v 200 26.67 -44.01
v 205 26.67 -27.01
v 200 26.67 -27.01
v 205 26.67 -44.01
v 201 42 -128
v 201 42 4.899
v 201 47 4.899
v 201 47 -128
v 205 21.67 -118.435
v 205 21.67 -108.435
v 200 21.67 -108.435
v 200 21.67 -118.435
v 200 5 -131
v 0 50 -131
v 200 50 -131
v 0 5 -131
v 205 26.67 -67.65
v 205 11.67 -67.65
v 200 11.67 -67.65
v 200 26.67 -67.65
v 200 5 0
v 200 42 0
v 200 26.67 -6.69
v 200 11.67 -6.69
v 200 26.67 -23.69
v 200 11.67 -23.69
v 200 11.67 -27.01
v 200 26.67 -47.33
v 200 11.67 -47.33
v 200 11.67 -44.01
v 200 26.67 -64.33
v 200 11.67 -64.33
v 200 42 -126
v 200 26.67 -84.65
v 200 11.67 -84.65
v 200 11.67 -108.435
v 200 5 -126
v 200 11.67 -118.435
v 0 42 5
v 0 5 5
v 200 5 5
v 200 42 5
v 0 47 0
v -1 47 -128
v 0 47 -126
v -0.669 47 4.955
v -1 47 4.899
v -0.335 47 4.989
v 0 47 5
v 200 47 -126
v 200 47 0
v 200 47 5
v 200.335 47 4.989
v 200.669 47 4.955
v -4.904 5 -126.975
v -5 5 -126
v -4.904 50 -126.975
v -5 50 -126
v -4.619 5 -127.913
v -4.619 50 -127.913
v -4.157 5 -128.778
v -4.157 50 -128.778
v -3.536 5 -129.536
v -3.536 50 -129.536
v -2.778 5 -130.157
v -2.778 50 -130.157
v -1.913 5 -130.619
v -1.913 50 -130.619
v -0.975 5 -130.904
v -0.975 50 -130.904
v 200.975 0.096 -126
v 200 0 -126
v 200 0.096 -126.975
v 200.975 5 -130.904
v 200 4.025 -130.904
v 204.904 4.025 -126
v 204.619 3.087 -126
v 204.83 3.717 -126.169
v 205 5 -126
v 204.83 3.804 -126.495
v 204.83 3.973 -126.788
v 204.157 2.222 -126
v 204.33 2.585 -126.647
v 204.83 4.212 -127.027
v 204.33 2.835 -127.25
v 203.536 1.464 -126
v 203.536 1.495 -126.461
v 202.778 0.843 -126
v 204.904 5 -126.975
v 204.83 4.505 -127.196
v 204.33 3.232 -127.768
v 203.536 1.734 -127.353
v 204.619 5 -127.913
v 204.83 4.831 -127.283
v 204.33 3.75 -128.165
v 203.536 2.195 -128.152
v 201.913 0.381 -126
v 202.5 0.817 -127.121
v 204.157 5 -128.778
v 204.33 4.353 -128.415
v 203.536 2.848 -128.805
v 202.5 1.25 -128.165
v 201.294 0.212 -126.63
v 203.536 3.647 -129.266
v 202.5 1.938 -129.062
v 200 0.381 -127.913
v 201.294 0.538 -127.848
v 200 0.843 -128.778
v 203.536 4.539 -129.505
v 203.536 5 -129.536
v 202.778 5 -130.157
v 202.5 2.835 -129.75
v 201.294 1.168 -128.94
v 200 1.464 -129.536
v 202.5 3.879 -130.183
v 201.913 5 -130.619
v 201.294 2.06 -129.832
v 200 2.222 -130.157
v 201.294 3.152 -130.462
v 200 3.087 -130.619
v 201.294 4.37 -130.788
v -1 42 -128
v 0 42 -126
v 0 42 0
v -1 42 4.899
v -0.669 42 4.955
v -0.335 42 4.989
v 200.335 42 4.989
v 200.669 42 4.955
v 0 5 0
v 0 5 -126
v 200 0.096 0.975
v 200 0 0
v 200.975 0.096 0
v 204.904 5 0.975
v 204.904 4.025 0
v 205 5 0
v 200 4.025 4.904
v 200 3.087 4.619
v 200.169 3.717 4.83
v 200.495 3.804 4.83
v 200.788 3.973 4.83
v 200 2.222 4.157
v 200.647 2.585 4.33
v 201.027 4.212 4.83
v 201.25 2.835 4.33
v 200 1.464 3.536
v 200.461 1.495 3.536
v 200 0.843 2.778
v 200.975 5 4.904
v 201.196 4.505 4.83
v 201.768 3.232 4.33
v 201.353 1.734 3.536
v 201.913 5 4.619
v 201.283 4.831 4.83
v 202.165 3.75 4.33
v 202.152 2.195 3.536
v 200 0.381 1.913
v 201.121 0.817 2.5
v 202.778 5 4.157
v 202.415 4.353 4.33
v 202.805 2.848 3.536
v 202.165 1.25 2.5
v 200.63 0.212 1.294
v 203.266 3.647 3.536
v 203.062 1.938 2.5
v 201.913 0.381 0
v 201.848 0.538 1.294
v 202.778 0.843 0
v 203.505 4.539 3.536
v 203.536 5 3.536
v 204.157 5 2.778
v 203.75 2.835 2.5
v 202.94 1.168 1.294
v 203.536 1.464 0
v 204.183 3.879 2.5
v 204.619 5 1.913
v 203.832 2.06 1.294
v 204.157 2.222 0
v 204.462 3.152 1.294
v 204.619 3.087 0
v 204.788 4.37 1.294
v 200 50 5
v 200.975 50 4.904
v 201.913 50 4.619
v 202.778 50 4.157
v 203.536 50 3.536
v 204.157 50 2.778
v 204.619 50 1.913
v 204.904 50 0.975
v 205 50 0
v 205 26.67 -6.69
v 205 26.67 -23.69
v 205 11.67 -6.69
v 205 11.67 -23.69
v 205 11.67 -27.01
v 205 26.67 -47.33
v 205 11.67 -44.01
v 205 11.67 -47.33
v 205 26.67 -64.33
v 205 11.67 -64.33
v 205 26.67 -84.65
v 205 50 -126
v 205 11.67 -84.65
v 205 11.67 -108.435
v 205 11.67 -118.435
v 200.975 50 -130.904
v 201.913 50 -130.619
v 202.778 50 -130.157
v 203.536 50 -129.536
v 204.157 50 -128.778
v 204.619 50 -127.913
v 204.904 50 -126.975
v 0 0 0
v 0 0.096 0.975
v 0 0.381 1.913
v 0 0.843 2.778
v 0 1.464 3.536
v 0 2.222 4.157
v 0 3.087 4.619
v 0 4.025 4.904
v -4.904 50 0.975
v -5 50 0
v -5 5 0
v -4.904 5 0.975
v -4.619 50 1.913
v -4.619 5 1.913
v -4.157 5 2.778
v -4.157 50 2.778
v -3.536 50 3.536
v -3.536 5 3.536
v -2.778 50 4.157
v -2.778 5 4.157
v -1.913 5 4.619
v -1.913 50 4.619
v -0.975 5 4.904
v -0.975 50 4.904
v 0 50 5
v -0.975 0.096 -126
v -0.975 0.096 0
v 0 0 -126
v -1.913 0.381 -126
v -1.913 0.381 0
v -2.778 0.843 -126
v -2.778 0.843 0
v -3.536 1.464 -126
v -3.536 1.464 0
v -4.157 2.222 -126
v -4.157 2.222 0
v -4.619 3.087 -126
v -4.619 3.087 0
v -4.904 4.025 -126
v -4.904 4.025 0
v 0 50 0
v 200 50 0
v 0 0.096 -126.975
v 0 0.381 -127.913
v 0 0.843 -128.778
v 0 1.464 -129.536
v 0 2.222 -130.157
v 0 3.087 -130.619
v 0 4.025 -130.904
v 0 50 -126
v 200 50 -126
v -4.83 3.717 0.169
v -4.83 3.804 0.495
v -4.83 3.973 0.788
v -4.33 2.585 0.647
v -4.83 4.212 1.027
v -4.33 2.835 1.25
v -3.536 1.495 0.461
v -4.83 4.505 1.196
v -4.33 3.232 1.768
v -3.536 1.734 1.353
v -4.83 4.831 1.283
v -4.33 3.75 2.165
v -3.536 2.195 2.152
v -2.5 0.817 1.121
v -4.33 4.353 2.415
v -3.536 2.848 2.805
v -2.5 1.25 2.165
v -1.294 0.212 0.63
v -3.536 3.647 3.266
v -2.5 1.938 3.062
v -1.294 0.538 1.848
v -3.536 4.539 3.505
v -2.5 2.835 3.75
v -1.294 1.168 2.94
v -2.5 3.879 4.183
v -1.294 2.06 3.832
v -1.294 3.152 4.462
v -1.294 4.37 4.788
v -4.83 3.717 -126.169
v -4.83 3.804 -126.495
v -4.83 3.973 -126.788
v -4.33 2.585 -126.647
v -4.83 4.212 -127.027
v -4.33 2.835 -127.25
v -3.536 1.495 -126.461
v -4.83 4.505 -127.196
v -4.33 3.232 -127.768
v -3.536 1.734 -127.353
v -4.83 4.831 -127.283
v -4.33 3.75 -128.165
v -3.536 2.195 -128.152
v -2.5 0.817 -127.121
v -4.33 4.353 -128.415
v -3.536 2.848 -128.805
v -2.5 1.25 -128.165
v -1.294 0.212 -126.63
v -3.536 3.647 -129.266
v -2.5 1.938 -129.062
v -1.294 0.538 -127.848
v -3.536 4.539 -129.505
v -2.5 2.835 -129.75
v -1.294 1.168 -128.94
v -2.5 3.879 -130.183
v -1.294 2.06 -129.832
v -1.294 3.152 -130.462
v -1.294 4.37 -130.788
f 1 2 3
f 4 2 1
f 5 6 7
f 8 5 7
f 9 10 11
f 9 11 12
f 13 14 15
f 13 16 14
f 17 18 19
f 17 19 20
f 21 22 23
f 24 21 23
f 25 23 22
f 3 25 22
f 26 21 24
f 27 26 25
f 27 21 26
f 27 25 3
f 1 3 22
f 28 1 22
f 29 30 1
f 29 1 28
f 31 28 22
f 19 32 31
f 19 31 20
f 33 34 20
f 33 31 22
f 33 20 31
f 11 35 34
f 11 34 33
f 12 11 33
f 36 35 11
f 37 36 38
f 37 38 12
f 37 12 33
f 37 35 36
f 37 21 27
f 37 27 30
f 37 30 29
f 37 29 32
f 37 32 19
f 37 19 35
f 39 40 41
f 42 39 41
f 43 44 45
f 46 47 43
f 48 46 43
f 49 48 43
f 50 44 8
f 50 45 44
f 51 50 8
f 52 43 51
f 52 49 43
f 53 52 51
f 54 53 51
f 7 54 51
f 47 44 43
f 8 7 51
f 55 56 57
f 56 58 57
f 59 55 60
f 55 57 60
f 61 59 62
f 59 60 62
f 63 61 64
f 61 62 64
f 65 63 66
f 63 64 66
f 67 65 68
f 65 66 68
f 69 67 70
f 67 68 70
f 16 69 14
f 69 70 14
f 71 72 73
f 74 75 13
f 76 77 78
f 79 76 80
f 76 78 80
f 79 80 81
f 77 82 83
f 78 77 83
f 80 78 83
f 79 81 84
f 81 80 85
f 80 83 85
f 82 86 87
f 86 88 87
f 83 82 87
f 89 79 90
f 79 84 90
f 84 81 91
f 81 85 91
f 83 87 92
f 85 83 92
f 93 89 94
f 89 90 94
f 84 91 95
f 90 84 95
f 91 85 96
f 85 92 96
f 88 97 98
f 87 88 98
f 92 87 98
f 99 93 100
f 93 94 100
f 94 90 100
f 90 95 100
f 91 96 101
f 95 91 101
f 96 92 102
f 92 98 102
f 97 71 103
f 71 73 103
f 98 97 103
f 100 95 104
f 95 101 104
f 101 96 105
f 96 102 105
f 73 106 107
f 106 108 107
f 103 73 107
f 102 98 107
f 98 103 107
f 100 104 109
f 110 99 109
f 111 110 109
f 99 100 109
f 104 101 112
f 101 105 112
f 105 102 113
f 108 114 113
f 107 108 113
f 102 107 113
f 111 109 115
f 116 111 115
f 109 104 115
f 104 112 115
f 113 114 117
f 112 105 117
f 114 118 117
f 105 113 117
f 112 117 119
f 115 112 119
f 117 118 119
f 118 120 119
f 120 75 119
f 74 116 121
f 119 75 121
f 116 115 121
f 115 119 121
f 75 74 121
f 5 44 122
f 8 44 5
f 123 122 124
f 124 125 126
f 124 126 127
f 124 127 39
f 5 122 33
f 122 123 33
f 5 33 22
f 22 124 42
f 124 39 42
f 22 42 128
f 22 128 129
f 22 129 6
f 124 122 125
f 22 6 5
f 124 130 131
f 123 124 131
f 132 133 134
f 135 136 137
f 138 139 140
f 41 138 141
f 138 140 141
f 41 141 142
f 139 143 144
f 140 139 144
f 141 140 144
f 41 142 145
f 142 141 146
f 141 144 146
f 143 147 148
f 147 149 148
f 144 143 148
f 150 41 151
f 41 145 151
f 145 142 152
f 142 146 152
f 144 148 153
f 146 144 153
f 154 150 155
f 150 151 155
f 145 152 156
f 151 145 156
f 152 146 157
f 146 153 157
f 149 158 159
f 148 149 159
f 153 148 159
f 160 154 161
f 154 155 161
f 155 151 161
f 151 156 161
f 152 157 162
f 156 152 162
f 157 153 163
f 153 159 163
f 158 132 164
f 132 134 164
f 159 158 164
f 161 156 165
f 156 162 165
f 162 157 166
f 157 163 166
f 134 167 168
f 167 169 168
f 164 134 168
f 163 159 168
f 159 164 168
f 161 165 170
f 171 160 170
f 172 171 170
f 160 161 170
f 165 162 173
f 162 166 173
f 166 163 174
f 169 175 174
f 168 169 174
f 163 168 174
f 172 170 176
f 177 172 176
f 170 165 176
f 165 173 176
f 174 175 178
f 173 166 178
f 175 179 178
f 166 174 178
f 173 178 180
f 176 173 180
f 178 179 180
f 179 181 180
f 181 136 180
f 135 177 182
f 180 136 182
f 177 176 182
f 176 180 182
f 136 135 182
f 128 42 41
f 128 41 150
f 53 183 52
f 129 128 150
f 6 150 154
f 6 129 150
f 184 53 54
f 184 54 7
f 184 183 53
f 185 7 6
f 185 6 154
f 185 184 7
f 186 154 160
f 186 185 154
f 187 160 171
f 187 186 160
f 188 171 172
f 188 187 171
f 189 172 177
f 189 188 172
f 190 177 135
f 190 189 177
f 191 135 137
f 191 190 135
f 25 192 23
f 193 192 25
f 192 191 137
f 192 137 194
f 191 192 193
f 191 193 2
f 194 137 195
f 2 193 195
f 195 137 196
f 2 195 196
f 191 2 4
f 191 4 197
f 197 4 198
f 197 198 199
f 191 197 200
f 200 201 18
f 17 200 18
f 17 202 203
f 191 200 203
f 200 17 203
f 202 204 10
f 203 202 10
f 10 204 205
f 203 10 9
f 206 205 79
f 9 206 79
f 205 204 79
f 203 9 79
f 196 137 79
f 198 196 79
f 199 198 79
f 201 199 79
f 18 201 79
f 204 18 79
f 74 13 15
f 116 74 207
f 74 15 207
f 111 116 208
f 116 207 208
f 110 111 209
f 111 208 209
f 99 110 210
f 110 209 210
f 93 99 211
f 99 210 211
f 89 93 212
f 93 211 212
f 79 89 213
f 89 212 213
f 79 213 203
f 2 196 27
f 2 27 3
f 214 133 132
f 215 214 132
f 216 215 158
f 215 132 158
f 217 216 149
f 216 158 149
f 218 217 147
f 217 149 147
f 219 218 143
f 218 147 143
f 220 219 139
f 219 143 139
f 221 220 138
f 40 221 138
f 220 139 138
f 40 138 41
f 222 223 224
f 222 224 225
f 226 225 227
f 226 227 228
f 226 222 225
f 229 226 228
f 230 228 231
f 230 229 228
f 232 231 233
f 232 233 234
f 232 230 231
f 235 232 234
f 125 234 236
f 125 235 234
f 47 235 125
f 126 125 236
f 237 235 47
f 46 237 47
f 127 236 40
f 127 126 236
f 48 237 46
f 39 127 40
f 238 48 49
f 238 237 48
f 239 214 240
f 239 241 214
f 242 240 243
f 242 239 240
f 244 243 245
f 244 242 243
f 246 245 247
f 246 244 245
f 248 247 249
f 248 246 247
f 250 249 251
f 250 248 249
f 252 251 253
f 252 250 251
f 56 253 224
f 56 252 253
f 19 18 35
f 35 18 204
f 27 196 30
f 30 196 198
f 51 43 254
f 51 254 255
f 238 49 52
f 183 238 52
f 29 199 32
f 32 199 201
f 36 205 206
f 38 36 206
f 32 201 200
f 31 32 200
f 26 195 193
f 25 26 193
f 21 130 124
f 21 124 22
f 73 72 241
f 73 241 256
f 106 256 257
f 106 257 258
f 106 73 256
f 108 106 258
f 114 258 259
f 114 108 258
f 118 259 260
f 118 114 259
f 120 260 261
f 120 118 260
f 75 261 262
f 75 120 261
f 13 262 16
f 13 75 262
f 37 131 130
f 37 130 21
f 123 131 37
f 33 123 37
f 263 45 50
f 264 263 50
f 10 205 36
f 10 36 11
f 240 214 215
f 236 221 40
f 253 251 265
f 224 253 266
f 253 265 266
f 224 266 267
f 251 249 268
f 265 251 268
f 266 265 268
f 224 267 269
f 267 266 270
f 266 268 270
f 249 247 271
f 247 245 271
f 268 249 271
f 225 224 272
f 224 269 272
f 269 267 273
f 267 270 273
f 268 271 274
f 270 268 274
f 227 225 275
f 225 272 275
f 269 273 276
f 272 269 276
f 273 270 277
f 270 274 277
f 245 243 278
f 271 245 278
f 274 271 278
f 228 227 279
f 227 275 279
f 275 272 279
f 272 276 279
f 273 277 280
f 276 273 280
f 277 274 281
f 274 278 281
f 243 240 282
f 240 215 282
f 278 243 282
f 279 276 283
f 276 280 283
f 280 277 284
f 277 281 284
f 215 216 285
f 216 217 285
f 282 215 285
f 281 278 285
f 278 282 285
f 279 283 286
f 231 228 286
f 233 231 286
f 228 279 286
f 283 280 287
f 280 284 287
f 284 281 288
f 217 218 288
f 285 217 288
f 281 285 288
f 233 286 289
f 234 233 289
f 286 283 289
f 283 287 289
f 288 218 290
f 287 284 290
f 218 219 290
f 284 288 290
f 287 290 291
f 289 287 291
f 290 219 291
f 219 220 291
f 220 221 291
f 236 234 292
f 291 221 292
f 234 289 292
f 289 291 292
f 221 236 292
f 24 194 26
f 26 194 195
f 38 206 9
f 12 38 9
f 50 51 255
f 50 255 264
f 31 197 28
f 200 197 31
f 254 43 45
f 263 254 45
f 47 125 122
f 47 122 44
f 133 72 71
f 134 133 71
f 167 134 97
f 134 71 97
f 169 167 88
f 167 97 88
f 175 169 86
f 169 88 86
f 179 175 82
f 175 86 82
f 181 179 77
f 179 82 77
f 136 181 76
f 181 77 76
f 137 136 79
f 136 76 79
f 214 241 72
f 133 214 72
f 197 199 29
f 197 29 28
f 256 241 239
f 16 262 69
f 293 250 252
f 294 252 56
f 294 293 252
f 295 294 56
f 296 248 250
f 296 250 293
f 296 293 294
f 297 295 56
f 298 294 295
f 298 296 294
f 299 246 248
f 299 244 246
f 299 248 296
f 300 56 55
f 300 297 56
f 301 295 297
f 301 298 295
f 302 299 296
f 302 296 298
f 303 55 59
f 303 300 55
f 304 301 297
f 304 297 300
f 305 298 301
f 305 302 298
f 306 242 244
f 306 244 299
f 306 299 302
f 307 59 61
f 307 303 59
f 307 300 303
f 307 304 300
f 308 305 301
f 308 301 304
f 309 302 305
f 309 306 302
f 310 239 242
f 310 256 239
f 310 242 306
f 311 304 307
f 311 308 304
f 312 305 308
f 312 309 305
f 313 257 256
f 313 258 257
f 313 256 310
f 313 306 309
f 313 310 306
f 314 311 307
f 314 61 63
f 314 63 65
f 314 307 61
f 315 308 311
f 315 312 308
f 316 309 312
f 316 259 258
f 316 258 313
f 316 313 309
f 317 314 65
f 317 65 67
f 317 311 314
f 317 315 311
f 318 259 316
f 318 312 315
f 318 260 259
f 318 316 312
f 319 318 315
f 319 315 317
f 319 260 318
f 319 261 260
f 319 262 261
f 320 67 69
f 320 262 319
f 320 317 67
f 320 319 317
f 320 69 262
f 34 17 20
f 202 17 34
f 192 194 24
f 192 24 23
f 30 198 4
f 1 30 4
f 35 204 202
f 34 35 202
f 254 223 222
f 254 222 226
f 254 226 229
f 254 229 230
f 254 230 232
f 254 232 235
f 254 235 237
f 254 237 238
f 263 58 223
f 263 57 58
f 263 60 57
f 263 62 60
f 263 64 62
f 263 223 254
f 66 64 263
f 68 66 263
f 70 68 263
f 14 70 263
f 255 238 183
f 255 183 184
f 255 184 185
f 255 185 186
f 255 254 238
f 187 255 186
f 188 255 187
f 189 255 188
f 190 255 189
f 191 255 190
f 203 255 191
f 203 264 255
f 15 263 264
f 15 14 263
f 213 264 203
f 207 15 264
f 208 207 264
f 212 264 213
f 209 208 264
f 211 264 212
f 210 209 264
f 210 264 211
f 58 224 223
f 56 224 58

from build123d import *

# Parameters (mm, degrees)
SKETCH1_W           = 210
SKETCH1_H           = 136
SKETCH1_W_2         = 200
SKETCH1_H_2         = 126
EXTRUDE_THIN1_DEPTH = 50
SKETCH1_2_W         = 200
SKETCH1_2_H         = 126
BOSS_EXTRUDE1_DEPTH = 5
FILLET1_R           = 5
SKETCH2_W           = 202
SKETCH2_H           = 5
CUT_EXTRUDE1_DEPTH  = 133
SKETCH3_W           = 17
SKETCH3_H           = 15
SKETCH3_W_2         = 10
SKETCH3_H_2         = 10
CUT_EXTRUDE2_DEPTH  = 10


with BuildPart() as part:
    # Sketch1 → Extrude-Thin1 (new body)
    with BuildSketch(Plane(origin=(0, 0, 0), x_dir=(1, 0, 0), z_dir=(0, 1, 0))):
        with Locations((100, 63)):
            Rectangle(SKETCH1_W, SKETCH1_H)
        with Locations((100, 63)):
            Rectangle(SKETCH1_W_2, SKETCH1_H_2, mode=Mode.SUBTRACT)
    extrude(amount=EXTRUDE_THIN1_DEPTH)

    # Sketch1<2> → Boss-Extrude1 (add)
    with BuildSketch(Plane(origin=(0, 0, 0), x_dir=(1, 0, 0), z_dir=(0, 1, 0))):
        with Locations((100, 63)):
            Rectangle(SKETCH1_2_W, SKETCH1_2_H)
    extrude(amount=BOSS_EXTRUDE1_DEPTH)

    # Fillet1
    fillet1_edges = [part.edges().sort_by_distance(p)[0] for p in [
        (100, 0, -131),
        (205, 0, -63),
        (100, 0, 5),
        (-5, 0, -63),
        (-5, 25, -131),
        (205, 25, -131),
        (205, 25, 5),
        (-5, 25, 5),
    ]]
    fillet(fillet1_edges, radius=FILLET1_R)

    # Sketch2 → Cut-Extrude1 (cut)
    with BuildSketch(Plane.XY.offset(5)):
        with Locations((100, 44.5)):
            Rectangle(SKETCH2_W, SKETCH2_H)
    extrude(amount=-CUT_EXTRUDE1_DEPTH, mode=Mode.SUBTRACT)

    # Sketch3 → Cut-Extrude2 (cut)
    with BuildSketch(Plane(origin=(205, 0, 0), x_dir=(0, 0, -1), z_dir=(1, 0, 0))):
        with Locations((15.19, 19.17)):
            Rectangle(SKETCH3_W, SKETCH3_H)
        with Locations((35.51, 19.17)):
            Rectangle(SKETCH3_W, SKETCH3_H)
        with Locations((55.83, 19.17)):
            Rectangle(SKETCH3_W, SKETCH3_H)
        with Locations((76.15, 19.17)):
            Rectangle(SKETCH3_W, SKETCH3_H)
        with Locations((113.435, 16.67)):
            Rectangle(SKETCH3_W_2, SKETCH3_H_2)
    extrude(amount=-CUT_EXTRUDE2_DEPTH, mode=Mode.SUBTRACT)


solid = part.part
